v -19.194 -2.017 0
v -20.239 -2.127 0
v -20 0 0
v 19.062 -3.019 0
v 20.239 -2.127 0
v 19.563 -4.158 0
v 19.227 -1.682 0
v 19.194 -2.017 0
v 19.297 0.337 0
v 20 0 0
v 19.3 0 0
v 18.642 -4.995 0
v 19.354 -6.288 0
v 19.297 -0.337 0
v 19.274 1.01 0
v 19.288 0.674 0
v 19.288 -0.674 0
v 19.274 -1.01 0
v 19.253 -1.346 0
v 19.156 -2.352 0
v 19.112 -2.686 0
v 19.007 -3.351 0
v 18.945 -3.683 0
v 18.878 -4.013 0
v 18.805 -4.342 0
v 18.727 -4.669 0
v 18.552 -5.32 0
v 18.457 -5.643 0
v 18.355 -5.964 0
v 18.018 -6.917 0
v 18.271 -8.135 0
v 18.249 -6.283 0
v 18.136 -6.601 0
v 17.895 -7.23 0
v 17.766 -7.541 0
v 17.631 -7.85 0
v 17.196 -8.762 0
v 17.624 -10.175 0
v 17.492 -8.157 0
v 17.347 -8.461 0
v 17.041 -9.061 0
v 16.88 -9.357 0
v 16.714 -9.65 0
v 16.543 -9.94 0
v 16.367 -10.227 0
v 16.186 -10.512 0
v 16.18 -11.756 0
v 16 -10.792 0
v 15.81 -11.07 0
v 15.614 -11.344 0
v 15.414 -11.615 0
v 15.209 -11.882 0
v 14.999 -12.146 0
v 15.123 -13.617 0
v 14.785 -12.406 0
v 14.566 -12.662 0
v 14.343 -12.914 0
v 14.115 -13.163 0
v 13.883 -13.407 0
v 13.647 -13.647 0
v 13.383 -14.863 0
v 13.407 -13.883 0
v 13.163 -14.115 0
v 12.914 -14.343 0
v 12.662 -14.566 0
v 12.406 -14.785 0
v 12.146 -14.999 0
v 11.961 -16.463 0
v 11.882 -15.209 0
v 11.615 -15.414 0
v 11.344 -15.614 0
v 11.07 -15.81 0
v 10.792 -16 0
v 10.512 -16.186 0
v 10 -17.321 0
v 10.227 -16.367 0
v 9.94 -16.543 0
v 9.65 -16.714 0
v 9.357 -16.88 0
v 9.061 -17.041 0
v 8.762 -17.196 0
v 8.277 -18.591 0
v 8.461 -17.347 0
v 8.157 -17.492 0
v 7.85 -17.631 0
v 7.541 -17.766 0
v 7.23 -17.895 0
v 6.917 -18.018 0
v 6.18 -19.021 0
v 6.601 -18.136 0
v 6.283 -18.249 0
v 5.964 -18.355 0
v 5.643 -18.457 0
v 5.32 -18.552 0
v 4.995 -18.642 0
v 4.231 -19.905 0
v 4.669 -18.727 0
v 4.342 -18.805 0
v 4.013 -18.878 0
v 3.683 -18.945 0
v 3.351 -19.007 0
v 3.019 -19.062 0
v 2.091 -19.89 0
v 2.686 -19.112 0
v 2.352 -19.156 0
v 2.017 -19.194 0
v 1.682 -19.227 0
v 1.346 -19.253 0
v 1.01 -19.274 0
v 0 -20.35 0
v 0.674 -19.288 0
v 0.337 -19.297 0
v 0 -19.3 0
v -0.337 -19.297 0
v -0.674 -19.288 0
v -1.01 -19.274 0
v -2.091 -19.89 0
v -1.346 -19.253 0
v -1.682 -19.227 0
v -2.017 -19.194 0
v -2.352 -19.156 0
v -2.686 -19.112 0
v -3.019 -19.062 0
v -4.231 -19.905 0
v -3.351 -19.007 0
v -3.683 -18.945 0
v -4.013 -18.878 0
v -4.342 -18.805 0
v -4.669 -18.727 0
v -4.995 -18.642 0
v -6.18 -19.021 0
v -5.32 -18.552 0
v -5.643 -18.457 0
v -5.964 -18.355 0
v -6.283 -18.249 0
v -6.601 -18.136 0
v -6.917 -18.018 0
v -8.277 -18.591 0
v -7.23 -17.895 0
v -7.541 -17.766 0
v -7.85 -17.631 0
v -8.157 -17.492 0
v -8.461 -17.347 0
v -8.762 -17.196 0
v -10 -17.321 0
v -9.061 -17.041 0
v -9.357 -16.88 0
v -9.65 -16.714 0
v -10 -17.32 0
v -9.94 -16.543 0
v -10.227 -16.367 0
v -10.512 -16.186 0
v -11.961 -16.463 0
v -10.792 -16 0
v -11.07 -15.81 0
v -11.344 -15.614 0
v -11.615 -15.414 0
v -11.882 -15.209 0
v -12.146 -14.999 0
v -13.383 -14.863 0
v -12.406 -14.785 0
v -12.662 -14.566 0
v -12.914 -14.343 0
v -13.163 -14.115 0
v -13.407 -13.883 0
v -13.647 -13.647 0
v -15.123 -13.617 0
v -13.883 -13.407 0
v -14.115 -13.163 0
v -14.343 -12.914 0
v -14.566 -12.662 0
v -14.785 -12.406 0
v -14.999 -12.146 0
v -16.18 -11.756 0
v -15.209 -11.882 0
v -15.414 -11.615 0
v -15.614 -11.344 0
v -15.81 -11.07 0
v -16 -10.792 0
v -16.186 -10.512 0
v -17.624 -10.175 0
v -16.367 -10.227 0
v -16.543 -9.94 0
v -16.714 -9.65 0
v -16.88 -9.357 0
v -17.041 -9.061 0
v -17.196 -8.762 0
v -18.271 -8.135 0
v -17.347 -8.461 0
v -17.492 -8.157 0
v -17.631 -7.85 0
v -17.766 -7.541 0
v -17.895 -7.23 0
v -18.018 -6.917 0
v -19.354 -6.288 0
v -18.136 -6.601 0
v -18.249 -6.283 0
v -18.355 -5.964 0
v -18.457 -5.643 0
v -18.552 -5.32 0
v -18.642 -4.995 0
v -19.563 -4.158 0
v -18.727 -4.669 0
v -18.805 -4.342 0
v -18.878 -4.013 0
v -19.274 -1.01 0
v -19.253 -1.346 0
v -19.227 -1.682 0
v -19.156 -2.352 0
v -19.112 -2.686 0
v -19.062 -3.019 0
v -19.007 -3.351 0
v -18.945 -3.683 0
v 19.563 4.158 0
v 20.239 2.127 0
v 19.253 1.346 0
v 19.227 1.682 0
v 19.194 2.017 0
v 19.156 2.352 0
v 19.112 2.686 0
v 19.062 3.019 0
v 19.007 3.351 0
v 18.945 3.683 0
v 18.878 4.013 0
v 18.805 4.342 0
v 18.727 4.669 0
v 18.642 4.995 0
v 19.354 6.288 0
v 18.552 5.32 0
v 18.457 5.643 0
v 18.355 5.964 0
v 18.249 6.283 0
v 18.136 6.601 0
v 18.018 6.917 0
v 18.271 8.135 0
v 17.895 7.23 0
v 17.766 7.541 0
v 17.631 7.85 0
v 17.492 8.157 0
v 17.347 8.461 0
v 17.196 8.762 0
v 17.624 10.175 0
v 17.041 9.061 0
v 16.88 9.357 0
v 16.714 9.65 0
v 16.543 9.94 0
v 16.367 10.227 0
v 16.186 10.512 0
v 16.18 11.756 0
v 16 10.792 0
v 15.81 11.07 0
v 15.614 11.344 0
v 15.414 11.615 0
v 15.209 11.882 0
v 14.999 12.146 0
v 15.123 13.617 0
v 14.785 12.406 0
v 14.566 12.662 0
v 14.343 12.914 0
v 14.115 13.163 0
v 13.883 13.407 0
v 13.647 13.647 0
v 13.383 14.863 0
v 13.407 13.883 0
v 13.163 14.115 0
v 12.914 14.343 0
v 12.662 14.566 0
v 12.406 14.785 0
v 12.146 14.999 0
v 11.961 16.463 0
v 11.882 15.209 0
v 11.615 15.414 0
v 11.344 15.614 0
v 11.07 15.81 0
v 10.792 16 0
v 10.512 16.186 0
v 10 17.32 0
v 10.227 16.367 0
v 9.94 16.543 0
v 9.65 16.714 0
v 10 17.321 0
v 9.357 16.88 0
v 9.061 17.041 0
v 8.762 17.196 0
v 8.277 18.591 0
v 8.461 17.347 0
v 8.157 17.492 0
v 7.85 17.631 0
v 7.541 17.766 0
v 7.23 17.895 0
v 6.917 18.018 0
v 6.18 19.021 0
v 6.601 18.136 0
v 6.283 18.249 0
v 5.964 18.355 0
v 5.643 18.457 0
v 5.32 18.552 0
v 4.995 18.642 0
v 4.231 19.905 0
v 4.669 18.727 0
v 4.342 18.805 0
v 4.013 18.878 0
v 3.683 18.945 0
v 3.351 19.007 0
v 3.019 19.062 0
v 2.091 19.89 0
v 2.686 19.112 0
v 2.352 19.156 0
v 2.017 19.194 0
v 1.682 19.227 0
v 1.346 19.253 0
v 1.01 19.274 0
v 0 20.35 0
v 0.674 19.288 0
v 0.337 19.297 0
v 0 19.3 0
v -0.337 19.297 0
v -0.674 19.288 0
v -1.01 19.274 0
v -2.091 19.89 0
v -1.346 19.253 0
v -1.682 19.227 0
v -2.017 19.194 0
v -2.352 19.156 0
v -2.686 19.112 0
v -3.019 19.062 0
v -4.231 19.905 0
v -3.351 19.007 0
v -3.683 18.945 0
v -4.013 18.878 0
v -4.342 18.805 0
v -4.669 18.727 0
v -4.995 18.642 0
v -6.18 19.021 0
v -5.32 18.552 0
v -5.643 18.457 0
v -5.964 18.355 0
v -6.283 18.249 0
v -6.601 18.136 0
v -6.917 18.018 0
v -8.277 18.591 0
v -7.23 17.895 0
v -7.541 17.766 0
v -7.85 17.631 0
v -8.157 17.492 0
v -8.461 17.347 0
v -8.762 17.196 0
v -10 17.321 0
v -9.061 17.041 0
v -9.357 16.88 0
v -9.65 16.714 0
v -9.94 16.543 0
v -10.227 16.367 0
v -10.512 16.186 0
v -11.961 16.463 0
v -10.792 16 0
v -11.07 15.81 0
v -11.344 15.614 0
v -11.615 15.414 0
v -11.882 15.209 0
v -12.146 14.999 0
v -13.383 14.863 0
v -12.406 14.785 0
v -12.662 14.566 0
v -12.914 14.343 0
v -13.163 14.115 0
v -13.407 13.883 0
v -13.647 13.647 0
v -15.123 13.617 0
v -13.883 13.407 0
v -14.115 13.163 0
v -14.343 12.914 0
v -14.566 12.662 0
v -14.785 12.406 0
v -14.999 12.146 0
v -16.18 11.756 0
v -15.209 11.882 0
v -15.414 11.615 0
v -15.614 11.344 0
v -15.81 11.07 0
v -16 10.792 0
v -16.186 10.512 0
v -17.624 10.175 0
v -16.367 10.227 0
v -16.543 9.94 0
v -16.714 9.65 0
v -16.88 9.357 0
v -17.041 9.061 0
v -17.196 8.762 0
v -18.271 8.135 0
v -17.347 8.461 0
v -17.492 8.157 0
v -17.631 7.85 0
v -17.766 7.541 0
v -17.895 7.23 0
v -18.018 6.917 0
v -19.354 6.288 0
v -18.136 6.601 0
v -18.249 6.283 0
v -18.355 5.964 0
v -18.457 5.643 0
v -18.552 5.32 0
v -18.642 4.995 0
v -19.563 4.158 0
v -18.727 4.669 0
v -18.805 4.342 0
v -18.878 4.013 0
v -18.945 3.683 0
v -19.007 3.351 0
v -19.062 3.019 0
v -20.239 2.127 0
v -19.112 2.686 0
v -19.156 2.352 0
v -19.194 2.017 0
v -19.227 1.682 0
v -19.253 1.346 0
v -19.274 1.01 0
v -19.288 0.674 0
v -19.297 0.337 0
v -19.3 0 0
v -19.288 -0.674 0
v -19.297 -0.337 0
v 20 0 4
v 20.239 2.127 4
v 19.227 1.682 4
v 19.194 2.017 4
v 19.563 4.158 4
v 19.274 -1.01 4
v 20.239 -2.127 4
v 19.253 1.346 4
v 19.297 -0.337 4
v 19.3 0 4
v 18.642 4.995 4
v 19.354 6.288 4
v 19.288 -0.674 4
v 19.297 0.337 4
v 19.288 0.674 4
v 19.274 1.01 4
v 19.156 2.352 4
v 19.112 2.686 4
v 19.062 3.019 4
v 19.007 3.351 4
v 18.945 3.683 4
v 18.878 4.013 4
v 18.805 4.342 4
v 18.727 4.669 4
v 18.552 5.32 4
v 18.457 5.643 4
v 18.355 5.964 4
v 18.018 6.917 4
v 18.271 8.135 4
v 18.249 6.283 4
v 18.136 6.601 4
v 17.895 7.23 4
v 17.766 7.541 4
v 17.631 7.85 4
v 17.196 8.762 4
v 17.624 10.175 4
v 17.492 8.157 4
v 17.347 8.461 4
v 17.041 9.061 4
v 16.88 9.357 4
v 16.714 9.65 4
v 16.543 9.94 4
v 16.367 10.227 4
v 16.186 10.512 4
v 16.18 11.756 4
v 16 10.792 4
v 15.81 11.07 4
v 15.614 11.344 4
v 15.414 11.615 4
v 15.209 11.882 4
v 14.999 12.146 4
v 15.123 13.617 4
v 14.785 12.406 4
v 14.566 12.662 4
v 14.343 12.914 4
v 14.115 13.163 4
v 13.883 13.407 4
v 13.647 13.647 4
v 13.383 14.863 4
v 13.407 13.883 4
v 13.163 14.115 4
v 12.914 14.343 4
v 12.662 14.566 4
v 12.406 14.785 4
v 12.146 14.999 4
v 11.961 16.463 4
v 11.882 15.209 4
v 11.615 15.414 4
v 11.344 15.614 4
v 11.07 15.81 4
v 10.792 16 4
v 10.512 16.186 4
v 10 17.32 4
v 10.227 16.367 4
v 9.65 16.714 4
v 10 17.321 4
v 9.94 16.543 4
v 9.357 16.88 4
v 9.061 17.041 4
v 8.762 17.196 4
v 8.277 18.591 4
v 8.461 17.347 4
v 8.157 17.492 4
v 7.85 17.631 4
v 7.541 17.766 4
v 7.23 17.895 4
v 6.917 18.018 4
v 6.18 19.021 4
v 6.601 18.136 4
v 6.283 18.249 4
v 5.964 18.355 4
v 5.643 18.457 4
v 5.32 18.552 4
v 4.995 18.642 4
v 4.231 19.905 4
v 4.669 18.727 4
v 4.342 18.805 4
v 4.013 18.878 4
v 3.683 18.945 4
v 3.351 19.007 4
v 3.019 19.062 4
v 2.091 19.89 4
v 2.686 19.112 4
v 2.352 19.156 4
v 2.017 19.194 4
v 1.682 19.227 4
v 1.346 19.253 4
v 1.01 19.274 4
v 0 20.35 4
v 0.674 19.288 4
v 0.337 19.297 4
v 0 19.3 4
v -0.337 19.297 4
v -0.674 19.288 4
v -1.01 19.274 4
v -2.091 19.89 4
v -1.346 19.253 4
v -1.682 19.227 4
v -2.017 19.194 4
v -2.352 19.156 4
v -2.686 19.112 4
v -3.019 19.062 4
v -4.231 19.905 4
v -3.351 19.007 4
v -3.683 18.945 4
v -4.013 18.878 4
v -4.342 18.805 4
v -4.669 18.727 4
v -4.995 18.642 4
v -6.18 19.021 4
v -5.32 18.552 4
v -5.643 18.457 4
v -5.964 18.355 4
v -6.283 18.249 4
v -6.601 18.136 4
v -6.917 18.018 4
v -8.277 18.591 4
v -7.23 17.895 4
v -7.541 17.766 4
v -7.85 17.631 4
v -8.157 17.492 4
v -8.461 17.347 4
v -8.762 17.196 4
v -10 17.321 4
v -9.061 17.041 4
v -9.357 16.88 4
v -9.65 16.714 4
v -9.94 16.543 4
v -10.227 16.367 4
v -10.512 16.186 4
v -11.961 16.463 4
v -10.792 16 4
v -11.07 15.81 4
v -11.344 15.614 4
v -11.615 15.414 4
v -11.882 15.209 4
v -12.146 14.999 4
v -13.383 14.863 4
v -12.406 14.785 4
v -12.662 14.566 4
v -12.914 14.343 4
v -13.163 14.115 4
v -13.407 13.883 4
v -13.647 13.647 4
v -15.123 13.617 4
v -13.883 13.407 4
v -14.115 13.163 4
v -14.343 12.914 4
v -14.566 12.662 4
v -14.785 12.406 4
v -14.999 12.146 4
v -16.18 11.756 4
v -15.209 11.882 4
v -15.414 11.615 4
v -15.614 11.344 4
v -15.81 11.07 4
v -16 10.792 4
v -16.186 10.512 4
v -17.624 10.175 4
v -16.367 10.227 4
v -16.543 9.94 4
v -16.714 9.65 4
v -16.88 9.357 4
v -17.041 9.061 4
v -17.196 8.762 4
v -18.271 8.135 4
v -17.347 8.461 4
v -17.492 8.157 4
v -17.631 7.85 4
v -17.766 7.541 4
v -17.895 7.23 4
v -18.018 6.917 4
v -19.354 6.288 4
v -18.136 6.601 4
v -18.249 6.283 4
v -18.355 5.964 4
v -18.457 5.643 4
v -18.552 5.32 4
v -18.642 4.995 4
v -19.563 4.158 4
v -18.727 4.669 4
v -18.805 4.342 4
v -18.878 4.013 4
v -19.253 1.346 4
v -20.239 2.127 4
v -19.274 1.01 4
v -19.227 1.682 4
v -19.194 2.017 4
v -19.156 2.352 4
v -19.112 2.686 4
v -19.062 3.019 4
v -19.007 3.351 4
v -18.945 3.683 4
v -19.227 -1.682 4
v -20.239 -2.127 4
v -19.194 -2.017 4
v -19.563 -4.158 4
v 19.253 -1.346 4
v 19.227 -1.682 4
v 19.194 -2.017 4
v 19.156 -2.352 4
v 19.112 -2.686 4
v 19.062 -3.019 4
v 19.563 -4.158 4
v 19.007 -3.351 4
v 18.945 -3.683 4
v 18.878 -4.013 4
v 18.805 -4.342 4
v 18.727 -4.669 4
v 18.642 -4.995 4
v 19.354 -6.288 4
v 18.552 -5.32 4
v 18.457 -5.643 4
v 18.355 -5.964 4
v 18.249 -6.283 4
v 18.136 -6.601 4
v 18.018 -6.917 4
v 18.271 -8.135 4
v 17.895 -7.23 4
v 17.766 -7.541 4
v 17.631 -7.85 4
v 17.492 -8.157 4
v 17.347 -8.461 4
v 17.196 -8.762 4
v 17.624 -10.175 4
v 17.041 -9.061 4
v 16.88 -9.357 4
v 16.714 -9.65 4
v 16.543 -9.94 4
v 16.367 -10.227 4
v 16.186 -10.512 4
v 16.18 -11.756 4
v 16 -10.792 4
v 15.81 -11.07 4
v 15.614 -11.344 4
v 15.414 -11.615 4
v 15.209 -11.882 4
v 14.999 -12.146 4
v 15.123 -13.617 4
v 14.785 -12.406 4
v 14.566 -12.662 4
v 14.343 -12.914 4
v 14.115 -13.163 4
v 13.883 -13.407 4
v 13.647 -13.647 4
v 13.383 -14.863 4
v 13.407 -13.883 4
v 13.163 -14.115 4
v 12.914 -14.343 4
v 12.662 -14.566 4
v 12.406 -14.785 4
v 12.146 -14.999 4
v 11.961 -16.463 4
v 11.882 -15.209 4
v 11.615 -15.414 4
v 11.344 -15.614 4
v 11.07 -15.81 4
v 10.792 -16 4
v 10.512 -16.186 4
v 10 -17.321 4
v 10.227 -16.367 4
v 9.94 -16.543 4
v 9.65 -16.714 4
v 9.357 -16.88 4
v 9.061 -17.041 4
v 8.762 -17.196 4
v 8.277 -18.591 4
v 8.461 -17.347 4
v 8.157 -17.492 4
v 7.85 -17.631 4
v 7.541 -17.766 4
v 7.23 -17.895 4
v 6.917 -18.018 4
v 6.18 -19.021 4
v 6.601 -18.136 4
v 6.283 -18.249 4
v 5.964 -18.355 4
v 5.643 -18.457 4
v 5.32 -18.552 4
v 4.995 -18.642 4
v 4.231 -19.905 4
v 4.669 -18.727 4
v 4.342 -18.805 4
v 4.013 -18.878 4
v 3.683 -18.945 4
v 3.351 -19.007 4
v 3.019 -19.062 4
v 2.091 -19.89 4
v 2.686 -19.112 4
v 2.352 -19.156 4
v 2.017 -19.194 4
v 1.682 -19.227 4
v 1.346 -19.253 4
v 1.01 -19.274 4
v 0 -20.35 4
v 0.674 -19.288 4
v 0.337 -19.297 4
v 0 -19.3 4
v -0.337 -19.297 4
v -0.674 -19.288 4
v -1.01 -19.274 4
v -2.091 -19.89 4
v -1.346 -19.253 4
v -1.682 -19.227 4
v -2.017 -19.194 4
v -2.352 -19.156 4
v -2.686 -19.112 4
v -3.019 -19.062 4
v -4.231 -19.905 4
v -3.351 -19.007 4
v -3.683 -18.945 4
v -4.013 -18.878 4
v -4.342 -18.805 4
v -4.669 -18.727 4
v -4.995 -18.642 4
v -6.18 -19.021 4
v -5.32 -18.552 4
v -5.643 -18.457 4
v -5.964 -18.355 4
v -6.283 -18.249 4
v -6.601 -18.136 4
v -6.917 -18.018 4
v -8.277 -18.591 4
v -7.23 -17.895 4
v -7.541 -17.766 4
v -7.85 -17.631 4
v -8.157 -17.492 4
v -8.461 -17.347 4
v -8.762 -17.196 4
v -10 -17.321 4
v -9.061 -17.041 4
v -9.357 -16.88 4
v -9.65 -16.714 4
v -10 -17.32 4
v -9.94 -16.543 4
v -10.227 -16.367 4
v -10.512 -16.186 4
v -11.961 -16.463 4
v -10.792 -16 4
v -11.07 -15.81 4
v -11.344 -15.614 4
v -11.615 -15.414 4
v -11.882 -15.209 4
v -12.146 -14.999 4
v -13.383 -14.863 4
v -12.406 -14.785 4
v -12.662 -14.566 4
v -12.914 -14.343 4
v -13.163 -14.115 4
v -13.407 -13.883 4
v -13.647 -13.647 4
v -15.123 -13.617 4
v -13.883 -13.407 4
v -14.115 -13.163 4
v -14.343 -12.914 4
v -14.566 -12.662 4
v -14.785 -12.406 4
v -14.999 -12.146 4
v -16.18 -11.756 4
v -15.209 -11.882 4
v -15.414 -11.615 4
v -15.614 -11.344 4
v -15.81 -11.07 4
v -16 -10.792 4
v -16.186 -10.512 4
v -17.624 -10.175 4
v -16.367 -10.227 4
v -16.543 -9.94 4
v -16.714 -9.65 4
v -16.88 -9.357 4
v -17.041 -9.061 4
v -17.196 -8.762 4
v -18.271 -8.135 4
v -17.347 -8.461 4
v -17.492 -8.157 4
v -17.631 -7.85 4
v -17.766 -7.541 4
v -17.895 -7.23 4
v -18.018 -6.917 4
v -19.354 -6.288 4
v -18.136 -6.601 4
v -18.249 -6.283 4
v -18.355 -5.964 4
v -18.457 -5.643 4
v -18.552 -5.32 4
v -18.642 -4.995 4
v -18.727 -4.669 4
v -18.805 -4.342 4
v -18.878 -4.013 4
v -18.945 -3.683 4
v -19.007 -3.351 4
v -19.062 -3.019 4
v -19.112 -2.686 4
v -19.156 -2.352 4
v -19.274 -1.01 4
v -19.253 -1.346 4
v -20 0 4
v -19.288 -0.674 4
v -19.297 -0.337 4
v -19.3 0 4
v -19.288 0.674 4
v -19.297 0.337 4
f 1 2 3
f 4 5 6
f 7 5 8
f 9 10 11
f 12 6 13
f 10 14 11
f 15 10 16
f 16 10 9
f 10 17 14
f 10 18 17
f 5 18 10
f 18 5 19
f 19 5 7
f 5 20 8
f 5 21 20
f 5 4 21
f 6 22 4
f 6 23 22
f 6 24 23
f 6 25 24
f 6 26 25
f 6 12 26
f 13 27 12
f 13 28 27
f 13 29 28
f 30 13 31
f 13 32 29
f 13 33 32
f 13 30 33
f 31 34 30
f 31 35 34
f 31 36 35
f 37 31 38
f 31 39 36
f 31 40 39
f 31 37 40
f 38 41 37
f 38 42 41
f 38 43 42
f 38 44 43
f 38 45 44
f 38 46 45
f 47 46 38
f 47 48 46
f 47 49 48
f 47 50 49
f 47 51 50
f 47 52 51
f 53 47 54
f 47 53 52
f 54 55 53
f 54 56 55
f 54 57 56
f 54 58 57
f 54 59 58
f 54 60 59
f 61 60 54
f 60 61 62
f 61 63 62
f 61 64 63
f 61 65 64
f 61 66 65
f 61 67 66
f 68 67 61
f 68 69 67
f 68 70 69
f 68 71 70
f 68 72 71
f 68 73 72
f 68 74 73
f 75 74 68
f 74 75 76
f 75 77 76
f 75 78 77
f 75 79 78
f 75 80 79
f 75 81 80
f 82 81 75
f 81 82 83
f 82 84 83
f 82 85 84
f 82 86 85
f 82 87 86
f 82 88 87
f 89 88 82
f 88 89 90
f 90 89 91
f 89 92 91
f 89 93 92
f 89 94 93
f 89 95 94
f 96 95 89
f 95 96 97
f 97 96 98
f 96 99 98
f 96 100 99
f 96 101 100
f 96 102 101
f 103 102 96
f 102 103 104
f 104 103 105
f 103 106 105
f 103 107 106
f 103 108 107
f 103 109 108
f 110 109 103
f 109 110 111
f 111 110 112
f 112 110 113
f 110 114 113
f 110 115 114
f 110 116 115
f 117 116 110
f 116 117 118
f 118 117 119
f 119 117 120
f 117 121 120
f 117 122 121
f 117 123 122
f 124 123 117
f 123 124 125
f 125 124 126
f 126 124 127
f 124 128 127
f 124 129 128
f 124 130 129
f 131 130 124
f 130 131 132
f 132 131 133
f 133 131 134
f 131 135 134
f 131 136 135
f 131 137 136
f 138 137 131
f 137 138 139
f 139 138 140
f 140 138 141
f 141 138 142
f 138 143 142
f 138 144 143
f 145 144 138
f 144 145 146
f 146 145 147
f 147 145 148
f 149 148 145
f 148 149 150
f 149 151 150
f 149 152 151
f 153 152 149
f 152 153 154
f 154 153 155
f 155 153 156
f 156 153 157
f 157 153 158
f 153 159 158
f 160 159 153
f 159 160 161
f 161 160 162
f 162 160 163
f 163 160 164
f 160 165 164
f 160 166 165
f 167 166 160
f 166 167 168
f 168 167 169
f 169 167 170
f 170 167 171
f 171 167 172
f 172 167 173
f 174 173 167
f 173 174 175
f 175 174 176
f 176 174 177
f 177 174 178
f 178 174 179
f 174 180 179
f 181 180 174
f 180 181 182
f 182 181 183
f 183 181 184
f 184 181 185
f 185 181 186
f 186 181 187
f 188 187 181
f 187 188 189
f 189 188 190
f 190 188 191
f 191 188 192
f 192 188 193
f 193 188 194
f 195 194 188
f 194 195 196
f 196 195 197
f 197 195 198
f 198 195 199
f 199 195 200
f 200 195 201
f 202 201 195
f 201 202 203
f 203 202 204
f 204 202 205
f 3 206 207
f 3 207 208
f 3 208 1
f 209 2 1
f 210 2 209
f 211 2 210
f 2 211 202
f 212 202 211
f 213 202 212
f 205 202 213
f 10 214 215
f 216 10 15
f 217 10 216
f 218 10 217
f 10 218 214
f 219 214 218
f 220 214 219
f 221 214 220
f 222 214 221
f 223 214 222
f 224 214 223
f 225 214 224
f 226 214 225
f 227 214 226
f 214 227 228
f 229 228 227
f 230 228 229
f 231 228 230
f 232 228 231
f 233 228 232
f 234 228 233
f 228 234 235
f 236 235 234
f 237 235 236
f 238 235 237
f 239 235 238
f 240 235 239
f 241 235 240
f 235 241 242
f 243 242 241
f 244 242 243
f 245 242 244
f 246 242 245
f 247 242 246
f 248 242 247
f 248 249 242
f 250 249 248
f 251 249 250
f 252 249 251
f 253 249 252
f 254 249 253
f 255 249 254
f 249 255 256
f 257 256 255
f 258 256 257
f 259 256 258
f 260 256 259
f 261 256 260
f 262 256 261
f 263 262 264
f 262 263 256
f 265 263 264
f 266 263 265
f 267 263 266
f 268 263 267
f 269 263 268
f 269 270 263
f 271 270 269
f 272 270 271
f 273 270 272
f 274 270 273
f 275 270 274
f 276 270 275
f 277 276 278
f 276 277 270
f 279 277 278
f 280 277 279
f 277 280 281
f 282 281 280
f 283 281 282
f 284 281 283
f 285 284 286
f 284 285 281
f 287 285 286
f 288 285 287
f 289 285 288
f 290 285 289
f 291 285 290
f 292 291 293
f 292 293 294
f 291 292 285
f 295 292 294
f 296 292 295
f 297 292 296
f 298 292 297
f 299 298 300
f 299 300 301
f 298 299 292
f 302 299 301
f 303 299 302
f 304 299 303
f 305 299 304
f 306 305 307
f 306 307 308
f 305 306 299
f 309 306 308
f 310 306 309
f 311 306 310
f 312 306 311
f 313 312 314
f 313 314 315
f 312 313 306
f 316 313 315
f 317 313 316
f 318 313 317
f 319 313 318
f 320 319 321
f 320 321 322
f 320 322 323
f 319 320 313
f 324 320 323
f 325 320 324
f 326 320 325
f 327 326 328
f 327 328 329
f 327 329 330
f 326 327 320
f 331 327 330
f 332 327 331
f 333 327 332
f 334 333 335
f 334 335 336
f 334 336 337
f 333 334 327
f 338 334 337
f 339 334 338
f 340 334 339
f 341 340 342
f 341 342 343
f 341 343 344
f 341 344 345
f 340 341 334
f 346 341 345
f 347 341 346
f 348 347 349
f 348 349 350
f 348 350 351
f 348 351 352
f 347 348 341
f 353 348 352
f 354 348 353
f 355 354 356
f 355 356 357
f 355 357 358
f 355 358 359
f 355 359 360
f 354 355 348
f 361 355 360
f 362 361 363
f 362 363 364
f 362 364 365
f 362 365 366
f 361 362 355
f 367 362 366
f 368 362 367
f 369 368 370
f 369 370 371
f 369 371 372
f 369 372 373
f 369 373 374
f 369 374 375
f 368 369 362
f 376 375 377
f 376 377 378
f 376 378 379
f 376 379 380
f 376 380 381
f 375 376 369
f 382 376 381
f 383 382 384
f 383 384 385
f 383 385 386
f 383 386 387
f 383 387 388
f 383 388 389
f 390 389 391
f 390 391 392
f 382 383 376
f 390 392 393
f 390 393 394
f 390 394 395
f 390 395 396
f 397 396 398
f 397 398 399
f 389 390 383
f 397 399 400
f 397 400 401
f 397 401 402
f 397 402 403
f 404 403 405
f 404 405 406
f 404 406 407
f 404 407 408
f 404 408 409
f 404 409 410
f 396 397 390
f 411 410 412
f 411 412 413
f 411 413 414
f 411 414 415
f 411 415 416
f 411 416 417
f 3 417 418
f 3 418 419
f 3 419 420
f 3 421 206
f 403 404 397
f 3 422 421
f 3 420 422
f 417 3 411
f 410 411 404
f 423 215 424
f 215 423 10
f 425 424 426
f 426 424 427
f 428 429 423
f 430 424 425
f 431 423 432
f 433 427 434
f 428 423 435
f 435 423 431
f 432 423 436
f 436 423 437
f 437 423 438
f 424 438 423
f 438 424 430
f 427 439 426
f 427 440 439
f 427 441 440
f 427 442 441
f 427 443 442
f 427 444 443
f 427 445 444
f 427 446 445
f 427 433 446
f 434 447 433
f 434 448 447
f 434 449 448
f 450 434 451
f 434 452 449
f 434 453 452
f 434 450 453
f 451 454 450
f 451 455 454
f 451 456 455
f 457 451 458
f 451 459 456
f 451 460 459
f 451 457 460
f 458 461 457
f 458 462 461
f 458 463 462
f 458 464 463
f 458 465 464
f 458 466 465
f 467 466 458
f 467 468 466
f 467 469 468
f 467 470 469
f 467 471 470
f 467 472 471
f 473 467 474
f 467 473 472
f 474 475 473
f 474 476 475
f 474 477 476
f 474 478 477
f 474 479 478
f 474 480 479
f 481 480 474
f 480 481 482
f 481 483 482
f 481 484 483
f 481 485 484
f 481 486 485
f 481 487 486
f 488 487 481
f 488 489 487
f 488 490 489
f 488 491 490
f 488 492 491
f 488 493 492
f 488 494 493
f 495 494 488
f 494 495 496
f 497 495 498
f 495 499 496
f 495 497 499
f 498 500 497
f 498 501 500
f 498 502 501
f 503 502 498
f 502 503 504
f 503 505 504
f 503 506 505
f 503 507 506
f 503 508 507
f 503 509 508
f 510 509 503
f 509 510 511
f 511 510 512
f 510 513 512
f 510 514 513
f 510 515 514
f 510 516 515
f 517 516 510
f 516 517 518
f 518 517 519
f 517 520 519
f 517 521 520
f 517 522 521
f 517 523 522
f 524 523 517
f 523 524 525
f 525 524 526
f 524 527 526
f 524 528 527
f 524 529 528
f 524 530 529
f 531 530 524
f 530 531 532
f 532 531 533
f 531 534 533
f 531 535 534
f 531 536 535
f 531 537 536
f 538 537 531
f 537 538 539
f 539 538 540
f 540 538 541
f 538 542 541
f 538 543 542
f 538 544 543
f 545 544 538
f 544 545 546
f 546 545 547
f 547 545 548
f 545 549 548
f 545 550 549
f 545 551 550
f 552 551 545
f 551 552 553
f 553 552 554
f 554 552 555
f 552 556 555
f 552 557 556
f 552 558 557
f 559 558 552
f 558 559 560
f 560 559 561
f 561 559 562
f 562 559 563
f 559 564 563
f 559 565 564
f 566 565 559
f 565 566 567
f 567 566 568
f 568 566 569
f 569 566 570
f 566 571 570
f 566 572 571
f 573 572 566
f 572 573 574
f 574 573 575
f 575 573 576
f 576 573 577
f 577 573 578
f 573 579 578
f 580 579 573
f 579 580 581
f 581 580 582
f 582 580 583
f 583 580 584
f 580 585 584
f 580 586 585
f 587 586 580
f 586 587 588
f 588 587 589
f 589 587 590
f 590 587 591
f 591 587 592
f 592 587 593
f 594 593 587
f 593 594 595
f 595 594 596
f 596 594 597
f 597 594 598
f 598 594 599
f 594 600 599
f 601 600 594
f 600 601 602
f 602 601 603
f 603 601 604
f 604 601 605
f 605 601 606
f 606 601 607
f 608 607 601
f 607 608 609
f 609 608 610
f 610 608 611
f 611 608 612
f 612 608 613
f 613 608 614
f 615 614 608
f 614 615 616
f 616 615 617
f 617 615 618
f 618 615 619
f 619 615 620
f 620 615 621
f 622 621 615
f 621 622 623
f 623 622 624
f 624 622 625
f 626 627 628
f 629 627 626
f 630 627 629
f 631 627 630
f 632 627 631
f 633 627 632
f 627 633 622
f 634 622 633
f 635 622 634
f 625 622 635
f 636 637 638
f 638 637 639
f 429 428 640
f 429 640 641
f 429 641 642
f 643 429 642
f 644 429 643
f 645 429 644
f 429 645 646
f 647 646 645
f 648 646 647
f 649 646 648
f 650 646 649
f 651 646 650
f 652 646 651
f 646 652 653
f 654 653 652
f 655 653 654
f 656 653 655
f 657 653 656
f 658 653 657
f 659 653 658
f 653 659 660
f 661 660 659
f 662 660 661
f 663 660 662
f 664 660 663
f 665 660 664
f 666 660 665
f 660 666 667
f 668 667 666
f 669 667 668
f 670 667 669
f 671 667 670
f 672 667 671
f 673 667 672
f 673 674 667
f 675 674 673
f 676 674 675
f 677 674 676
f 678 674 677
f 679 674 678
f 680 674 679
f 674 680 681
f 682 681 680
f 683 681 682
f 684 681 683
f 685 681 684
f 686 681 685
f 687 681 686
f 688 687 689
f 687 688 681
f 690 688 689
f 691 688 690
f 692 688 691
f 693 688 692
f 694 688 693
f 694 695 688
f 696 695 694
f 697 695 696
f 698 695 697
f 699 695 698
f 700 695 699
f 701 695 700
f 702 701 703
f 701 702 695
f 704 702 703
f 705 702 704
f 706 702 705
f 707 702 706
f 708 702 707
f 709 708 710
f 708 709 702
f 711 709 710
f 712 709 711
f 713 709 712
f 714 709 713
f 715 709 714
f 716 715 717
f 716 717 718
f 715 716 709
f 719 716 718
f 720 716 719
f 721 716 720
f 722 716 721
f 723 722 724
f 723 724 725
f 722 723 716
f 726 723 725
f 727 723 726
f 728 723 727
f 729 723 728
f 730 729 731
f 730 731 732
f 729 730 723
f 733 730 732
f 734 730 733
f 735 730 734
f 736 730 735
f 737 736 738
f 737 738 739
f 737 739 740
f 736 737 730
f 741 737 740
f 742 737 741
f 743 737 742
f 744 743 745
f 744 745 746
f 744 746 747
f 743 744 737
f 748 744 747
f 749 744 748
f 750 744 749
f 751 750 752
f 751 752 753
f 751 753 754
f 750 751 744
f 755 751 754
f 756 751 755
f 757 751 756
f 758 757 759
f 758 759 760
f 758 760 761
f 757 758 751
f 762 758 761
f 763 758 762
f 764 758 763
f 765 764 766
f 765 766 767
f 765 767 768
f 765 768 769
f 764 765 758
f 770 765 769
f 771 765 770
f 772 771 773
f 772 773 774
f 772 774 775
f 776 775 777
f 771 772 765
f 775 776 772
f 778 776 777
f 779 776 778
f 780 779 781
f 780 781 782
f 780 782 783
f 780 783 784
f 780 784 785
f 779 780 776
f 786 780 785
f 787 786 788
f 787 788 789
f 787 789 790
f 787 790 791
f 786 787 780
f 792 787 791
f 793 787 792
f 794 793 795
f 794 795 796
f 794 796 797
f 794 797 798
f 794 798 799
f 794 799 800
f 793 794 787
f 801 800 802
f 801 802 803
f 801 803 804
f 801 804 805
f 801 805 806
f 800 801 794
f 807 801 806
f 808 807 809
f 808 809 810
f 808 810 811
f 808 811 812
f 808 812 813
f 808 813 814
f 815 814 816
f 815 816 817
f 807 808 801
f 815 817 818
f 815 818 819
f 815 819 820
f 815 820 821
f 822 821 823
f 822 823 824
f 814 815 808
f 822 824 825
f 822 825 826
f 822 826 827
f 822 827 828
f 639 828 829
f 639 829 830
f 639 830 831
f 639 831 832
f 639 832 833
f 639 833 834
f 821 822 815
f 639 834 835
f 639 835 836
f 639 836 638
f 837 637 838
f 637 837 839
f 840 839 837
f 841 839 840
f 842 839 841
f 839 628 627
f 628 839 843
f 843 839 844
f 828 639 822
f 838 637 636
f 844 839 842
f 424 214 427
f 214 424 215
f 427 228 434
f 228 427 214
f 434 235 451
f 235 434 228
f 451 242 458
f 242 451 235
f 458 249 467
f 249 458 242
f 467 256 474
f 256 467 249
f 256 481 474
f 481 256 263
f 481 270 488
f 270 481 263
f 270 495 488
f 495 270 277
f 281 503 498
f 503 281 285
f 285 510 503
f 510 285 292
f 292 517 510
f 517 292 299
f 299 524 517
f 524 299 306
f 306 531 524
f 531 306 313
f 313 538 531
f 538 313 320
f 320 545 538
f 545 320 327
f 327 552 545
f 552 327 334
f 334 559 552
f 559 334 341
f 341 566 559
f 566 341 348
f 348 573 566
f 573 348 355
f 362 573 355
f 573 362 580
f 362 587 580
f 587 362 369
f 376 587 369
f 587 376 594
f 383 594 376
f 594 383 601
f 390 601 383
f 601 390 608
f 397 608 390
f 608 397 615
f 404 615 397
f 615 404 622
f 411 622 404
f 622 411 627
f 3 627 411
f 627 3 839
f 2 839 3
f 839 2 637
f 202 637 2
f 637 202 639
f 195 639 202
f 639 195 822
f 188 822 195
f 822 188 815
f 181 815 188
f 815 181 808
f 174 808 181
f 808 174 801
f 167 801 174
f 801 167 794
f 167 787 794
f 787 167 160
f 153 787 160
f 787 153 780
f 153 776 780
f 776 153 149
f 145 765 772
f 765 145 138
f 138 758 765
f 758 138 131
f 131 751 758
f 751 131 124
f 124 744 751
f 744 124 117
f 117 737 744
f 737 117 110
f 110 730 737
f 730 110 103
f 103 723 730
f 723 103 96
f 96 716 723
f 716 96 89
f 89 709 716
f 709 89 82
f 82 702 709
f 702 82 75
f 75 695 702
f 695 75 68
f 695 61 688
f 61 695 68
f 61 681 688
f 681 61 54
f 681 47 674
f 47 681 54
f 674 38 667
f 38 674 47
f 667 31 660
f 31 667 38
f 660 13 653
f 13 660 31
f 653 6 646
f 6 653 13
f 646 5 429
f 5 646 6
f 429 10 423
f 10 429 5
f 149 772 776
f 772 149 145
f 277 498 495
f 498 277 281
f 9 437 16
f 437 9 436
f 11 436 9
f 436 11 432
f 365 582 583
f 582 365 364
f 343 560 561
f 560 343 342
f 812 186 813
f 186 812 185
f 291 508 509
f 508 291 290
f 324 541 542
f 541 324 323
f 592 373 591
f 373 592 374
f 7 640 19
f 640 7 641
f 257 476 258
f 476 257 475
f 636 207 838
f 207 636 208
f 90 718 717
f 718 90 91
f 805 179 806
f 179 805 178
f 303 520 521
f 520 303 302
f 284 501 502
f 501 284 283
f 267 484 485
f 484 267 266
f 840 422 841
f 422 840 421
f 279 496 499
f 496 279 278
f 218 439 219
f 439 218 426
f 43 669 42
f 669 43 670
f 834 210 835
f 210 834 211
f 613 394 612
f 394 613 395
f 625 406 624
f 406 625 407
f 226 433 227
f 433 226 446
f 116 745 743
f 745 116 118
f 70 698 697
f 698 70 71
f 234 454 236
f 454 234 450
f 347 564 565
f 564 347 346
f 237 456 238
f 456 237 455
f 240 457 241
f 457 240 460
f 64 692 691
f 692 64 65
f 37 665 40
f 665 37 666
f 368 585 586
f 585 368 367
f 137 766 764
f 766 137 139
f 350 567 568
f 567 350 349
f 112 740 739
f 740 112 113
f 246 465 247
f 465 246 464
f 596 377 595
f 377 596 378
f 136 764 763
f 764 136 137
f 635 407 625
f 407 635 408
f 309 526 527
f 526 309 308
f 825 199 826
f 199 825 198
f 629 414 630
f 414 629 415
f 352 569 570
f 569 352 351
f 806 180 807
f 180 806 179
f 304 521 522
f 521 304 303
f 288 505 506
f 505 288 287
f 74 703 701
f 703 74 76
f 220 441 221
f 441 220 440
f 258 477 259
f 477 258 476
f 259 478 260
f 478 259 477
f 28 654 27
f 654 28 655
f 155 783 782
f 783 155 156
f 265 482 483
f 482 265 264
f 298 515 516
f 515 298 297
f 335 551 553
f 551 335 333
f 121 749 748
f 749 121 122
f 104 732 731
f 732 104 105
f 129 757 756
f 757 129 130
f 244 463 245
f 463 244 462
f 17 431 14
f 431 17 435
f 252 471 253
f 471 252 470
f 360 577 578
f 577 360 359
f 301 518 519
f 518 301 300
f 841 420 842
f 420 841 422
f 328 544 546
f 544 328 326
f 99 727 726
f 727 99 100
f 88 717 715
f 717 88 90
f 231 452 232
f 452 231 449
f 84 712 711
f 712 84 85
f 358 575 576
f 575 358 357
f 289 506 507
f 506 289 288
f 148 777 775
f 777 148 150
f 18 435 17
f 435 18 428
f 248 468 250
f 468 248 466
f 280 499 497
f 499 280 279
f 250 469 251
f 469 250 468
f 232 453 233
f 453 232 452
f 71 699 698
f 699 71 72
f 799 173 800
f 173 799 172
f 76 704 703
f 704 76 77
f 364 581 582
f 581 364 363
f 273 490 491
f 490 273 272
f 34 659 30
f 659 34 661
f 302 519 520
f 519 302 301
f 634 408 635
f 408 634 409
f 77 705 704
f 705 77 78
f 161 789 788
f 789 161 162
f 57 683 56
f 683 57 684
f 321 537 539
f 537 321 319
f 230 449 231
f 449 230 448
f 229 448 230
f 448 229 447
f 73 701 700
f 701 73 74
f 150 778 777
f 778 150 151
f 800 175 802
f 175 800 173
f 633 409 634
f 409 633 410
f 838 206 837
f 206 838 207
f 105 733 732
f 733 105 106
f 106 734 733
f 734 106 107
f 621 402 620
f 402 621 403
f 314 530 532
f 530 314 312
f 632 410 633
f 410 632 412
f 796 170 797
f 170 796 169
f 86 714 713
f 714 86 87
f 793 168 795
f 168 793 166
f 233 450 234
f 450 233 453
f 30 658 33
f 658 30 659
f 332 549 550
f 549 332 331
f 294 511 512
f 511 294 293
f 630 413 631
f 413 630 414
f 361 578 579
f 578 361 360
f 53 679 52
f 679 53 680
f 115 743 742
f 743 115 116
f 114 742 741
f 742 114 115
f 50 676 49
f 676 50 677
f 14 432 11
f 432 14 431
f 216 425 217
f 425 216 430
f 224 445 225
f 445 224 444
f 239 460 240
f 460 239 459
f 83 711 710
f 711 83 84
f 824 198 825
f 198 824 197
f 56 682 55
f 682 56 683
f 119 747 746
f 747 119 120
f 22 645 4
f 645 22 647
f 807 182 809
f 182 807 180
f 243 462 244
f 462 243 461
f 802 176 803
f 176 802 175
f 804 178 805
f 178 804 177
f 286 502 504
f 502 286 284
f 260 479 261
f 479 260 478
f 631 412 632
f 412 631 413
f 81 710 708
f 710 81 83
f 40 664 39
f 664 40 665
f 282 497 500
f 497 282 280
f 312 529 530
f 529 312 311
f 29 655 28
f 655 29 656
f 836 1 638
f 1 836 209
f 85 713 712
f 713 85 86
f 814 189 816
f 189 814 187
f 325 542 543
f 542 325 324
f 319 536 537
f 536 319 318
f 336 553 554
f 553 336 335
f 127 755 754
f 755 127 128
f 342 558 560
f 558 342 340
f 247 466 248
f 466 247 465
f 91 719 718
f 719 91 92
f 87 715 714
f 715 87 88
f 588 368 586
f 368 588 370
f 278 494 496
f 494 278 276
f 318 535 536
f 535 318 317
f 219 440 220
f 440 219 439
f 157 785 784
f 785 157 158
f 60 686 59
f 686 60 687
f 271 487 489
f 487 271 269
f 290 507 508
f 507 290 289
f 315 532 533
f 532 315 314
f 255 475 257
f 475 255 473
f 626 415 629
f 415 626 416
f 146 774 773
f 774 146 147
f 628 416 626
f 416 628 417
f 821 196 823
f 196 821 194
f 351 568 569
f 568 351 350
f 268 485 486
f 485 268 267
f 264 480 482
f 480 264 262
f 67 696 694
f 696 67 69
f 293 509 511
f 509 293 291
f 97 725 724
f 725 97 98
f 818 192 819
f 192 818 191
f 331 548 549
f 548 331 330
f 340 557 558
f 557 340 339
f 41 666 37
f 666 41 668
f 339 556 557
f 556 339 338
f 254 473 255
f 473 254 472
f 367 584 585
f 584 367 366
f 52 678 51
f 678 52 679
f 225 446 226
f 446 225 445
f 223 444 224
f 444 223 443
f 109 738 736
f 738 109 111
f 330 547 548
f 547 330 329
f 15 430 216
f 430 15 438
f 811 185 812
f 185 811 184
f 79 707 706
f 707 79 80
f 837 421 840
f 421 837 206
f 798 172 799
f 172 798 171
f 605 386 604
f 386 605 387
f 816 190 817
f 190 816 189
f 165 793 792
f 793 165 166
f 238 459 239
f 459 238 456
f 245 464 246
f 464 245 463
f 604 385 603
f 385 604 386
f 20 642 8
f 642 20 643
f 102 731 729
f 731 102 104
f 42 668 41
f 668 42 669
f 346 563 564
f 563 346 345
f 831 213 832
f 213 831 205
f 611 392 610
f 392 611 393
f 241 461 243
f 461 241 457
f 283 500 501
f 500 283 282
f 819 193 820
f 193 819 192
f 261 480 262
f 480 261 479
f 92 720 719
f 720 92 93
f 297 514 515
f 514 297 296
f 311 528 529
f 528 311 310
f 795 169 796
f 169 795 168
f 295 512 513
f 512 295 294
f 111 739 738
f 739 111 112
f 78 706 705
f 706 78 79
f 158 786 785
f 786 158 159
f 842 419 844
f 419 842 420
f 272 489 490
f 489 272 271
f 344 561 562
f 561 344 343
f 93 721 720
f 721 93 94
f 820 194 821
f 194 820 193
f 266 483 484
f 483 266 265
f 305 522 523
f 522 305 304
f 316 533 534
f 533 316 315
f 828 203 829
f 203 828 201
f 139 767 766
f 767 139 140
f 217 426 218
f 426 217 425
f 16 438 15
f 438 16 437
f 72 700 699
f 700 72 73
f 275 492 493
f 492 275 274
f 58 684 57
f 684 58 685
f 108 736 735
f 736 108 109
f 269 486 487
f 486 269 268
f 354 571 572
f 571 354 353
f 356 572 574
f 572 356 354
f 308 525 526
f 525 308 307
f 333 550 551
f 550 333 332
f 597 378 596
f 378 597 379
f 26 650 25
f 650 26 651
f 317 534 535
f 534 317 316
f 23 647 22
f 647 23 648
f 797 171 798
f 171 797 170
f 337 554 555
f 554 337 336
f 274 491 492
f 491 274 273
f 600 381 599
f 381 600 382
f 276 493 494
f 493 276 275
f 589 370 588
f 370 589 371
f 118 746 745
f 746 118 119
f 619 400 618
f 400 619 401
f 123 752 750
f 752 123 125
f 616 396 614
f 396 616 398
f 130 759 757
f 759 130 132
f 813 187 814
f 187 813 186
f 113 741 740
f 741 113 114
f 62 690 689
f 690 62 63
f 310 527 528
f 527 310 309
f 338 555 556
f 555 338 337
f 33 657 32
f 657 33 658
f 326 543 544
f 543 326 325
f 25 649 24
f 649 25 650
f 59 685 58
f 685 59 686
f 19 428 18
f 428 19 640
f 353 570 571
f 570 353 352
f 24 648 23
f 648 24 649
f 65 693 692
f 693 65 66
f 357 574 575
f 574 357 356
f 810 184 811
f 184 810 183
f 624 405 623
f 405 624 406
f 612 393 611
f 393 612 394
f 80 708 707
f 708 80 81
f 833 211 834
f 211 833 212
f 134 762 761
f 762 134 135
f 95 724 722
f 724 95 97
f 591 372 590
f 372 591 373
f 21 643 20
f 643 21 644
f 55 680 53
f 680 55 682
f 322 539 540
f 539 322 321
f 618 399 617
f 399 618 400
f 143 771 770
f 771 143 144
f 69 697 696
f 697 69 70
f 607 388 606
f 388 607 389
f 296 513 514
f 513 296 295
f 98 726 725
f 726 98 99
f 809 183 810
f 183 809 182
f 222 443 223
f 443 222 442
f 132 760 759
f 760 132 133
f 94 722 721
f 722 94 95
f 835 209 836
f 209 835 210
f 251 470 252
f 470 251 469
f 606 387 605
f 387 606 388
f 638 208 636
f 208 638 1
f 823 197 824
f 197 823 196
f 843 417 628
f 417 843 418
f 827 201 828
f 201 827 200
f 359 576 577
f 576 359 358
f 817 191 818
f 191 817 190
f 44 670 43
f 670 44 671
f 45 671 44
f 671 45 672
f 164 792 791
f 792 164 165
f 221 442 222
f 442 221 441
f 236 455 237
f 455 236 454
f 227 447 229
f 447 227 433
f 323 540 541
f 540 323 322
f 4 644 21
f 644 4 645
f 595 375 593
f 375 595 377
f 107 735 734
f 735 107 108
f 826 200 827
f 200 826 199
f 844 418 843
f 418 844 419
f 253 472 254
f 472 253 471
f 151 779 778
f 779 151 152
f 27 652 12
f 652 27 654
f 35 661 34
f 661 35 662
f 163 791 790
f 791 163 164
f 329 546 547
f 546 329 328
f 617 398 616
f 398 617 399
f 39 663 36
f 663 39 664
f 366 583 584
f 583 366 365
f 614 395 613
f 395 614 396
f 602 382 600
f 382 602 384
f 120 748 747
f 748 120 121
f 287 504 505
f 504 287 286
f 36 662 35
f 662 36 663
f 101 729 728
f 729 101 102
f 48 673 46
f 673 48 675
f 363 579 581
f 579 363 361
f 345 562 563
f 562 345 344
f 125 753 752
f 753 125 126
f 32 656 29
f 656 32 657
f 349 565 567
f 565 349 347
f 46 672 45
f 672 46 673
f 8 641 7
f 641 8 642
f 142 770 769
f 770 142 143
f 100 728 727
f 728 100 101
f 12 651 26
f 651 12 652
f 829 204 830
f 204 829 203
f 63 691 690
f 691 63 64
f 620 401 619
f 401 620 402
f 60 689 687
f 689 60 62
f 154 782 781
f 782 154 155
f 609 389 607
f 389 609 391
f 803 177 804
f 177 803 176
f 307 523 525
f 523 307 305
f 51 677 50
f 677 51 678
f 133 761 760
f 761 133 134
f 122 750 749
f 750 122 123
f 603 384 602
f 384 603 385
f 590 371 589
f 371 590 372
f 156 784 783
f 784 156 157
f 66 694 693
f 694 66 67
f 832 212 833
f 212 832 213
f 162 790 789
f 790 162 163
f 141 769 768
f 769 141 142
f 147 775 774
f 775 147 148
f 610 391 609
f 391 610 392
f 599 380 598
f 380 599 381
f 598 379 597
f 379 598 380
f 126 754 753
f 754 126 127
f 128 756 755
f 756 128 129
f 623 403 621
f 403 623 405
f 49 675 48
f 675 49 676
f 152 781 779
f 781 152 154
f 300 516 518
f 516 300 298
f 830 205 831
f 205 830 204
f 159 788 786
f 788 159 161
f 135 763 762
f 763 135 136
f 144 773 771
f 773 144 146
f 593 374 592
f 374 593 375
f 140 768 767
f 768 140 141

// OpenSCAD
$fs = 0.3;
$fa = 1;
num_bars = 6;

module gear(height, radius, teeth_depth, teeth=30) {
	cylinder(h=height, r=radius, $fn=teeth);
	for(tooth = [0:teeth]) {
		rotate([0, 0, tooth * 360 / teeth]) {
			linear_extrude(height=height) {
				polygon(points=[[radius, 0], [cos(360 / teeth) * radius, sin(360 / teeth) * radius], [cos(180 / teeth) * (radius + teeth_depth), sin(180 / teeth) * (radius + teeth_depth)]], convexity=1);
			}
		}
	}
}

difference() {
	gear(height=4, radius=20, teeth_depth=0.35);
	translate([0, 0, -1]) {
		cylinder(r=19.3, h=6);
	}
}
